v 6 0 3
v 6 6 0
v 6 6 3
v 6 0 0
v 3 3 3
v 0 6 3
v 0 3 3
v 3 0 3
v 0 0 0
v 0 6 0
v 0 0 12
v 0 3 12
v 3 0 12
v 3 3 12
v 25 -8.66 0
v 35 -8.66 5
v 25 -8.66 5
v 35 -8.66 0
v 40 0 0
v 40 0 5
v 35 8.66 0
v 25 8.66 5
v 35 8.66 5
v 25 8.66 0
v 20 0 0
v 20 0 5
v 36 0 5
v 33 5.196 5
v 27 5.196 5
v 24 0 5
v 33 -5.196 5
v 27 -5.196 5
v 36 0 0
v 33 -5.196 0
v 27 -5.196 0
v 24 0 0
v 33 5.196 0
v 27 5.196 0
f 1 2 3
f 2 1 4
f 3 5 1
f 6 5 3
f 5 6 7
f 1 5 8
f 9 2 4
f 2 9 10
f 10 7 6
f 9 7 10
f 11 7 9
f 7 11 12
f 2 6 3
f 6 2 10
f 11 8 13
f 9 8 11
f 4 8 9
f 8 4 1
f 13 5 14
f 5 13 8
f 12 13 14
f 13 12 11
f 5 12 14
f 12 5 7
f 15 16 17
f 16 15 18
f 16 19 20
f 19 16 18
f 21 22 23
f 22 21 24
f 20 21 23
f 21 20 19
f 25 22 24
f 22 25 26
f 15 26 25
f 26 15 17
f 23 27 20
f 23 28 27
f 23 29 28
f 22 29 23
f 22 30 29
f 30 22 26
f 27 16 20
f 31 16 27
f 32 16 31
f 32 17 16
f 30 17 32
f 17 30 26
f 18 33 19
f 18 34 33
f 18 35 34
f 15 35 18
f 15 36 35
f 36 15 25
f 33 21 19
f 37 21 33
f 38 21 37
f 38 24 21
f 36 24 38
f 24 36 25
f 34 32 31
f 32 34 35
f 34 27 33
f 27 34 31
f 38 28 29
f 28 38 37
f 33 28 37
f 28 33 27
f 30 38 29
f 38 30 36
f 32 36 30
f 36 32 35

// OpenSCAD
// assignments inside a nested scope are block-local, evaluated before the block's statements
wall = 3;
translate([0, 0, 0]) {
    w = wall * 2;
    cube([w, w, wall]);
    h = w + wall;
    translate([0, 0, wall]) cube([wall, wall, h]);
}
module frame() {
    $fn = 6;
    difference() {
        cylinder(r = 10, h = 5);
        cylinder(r = 6, h = 5);
    }
}
translate([30, 0, 0]) frame();
